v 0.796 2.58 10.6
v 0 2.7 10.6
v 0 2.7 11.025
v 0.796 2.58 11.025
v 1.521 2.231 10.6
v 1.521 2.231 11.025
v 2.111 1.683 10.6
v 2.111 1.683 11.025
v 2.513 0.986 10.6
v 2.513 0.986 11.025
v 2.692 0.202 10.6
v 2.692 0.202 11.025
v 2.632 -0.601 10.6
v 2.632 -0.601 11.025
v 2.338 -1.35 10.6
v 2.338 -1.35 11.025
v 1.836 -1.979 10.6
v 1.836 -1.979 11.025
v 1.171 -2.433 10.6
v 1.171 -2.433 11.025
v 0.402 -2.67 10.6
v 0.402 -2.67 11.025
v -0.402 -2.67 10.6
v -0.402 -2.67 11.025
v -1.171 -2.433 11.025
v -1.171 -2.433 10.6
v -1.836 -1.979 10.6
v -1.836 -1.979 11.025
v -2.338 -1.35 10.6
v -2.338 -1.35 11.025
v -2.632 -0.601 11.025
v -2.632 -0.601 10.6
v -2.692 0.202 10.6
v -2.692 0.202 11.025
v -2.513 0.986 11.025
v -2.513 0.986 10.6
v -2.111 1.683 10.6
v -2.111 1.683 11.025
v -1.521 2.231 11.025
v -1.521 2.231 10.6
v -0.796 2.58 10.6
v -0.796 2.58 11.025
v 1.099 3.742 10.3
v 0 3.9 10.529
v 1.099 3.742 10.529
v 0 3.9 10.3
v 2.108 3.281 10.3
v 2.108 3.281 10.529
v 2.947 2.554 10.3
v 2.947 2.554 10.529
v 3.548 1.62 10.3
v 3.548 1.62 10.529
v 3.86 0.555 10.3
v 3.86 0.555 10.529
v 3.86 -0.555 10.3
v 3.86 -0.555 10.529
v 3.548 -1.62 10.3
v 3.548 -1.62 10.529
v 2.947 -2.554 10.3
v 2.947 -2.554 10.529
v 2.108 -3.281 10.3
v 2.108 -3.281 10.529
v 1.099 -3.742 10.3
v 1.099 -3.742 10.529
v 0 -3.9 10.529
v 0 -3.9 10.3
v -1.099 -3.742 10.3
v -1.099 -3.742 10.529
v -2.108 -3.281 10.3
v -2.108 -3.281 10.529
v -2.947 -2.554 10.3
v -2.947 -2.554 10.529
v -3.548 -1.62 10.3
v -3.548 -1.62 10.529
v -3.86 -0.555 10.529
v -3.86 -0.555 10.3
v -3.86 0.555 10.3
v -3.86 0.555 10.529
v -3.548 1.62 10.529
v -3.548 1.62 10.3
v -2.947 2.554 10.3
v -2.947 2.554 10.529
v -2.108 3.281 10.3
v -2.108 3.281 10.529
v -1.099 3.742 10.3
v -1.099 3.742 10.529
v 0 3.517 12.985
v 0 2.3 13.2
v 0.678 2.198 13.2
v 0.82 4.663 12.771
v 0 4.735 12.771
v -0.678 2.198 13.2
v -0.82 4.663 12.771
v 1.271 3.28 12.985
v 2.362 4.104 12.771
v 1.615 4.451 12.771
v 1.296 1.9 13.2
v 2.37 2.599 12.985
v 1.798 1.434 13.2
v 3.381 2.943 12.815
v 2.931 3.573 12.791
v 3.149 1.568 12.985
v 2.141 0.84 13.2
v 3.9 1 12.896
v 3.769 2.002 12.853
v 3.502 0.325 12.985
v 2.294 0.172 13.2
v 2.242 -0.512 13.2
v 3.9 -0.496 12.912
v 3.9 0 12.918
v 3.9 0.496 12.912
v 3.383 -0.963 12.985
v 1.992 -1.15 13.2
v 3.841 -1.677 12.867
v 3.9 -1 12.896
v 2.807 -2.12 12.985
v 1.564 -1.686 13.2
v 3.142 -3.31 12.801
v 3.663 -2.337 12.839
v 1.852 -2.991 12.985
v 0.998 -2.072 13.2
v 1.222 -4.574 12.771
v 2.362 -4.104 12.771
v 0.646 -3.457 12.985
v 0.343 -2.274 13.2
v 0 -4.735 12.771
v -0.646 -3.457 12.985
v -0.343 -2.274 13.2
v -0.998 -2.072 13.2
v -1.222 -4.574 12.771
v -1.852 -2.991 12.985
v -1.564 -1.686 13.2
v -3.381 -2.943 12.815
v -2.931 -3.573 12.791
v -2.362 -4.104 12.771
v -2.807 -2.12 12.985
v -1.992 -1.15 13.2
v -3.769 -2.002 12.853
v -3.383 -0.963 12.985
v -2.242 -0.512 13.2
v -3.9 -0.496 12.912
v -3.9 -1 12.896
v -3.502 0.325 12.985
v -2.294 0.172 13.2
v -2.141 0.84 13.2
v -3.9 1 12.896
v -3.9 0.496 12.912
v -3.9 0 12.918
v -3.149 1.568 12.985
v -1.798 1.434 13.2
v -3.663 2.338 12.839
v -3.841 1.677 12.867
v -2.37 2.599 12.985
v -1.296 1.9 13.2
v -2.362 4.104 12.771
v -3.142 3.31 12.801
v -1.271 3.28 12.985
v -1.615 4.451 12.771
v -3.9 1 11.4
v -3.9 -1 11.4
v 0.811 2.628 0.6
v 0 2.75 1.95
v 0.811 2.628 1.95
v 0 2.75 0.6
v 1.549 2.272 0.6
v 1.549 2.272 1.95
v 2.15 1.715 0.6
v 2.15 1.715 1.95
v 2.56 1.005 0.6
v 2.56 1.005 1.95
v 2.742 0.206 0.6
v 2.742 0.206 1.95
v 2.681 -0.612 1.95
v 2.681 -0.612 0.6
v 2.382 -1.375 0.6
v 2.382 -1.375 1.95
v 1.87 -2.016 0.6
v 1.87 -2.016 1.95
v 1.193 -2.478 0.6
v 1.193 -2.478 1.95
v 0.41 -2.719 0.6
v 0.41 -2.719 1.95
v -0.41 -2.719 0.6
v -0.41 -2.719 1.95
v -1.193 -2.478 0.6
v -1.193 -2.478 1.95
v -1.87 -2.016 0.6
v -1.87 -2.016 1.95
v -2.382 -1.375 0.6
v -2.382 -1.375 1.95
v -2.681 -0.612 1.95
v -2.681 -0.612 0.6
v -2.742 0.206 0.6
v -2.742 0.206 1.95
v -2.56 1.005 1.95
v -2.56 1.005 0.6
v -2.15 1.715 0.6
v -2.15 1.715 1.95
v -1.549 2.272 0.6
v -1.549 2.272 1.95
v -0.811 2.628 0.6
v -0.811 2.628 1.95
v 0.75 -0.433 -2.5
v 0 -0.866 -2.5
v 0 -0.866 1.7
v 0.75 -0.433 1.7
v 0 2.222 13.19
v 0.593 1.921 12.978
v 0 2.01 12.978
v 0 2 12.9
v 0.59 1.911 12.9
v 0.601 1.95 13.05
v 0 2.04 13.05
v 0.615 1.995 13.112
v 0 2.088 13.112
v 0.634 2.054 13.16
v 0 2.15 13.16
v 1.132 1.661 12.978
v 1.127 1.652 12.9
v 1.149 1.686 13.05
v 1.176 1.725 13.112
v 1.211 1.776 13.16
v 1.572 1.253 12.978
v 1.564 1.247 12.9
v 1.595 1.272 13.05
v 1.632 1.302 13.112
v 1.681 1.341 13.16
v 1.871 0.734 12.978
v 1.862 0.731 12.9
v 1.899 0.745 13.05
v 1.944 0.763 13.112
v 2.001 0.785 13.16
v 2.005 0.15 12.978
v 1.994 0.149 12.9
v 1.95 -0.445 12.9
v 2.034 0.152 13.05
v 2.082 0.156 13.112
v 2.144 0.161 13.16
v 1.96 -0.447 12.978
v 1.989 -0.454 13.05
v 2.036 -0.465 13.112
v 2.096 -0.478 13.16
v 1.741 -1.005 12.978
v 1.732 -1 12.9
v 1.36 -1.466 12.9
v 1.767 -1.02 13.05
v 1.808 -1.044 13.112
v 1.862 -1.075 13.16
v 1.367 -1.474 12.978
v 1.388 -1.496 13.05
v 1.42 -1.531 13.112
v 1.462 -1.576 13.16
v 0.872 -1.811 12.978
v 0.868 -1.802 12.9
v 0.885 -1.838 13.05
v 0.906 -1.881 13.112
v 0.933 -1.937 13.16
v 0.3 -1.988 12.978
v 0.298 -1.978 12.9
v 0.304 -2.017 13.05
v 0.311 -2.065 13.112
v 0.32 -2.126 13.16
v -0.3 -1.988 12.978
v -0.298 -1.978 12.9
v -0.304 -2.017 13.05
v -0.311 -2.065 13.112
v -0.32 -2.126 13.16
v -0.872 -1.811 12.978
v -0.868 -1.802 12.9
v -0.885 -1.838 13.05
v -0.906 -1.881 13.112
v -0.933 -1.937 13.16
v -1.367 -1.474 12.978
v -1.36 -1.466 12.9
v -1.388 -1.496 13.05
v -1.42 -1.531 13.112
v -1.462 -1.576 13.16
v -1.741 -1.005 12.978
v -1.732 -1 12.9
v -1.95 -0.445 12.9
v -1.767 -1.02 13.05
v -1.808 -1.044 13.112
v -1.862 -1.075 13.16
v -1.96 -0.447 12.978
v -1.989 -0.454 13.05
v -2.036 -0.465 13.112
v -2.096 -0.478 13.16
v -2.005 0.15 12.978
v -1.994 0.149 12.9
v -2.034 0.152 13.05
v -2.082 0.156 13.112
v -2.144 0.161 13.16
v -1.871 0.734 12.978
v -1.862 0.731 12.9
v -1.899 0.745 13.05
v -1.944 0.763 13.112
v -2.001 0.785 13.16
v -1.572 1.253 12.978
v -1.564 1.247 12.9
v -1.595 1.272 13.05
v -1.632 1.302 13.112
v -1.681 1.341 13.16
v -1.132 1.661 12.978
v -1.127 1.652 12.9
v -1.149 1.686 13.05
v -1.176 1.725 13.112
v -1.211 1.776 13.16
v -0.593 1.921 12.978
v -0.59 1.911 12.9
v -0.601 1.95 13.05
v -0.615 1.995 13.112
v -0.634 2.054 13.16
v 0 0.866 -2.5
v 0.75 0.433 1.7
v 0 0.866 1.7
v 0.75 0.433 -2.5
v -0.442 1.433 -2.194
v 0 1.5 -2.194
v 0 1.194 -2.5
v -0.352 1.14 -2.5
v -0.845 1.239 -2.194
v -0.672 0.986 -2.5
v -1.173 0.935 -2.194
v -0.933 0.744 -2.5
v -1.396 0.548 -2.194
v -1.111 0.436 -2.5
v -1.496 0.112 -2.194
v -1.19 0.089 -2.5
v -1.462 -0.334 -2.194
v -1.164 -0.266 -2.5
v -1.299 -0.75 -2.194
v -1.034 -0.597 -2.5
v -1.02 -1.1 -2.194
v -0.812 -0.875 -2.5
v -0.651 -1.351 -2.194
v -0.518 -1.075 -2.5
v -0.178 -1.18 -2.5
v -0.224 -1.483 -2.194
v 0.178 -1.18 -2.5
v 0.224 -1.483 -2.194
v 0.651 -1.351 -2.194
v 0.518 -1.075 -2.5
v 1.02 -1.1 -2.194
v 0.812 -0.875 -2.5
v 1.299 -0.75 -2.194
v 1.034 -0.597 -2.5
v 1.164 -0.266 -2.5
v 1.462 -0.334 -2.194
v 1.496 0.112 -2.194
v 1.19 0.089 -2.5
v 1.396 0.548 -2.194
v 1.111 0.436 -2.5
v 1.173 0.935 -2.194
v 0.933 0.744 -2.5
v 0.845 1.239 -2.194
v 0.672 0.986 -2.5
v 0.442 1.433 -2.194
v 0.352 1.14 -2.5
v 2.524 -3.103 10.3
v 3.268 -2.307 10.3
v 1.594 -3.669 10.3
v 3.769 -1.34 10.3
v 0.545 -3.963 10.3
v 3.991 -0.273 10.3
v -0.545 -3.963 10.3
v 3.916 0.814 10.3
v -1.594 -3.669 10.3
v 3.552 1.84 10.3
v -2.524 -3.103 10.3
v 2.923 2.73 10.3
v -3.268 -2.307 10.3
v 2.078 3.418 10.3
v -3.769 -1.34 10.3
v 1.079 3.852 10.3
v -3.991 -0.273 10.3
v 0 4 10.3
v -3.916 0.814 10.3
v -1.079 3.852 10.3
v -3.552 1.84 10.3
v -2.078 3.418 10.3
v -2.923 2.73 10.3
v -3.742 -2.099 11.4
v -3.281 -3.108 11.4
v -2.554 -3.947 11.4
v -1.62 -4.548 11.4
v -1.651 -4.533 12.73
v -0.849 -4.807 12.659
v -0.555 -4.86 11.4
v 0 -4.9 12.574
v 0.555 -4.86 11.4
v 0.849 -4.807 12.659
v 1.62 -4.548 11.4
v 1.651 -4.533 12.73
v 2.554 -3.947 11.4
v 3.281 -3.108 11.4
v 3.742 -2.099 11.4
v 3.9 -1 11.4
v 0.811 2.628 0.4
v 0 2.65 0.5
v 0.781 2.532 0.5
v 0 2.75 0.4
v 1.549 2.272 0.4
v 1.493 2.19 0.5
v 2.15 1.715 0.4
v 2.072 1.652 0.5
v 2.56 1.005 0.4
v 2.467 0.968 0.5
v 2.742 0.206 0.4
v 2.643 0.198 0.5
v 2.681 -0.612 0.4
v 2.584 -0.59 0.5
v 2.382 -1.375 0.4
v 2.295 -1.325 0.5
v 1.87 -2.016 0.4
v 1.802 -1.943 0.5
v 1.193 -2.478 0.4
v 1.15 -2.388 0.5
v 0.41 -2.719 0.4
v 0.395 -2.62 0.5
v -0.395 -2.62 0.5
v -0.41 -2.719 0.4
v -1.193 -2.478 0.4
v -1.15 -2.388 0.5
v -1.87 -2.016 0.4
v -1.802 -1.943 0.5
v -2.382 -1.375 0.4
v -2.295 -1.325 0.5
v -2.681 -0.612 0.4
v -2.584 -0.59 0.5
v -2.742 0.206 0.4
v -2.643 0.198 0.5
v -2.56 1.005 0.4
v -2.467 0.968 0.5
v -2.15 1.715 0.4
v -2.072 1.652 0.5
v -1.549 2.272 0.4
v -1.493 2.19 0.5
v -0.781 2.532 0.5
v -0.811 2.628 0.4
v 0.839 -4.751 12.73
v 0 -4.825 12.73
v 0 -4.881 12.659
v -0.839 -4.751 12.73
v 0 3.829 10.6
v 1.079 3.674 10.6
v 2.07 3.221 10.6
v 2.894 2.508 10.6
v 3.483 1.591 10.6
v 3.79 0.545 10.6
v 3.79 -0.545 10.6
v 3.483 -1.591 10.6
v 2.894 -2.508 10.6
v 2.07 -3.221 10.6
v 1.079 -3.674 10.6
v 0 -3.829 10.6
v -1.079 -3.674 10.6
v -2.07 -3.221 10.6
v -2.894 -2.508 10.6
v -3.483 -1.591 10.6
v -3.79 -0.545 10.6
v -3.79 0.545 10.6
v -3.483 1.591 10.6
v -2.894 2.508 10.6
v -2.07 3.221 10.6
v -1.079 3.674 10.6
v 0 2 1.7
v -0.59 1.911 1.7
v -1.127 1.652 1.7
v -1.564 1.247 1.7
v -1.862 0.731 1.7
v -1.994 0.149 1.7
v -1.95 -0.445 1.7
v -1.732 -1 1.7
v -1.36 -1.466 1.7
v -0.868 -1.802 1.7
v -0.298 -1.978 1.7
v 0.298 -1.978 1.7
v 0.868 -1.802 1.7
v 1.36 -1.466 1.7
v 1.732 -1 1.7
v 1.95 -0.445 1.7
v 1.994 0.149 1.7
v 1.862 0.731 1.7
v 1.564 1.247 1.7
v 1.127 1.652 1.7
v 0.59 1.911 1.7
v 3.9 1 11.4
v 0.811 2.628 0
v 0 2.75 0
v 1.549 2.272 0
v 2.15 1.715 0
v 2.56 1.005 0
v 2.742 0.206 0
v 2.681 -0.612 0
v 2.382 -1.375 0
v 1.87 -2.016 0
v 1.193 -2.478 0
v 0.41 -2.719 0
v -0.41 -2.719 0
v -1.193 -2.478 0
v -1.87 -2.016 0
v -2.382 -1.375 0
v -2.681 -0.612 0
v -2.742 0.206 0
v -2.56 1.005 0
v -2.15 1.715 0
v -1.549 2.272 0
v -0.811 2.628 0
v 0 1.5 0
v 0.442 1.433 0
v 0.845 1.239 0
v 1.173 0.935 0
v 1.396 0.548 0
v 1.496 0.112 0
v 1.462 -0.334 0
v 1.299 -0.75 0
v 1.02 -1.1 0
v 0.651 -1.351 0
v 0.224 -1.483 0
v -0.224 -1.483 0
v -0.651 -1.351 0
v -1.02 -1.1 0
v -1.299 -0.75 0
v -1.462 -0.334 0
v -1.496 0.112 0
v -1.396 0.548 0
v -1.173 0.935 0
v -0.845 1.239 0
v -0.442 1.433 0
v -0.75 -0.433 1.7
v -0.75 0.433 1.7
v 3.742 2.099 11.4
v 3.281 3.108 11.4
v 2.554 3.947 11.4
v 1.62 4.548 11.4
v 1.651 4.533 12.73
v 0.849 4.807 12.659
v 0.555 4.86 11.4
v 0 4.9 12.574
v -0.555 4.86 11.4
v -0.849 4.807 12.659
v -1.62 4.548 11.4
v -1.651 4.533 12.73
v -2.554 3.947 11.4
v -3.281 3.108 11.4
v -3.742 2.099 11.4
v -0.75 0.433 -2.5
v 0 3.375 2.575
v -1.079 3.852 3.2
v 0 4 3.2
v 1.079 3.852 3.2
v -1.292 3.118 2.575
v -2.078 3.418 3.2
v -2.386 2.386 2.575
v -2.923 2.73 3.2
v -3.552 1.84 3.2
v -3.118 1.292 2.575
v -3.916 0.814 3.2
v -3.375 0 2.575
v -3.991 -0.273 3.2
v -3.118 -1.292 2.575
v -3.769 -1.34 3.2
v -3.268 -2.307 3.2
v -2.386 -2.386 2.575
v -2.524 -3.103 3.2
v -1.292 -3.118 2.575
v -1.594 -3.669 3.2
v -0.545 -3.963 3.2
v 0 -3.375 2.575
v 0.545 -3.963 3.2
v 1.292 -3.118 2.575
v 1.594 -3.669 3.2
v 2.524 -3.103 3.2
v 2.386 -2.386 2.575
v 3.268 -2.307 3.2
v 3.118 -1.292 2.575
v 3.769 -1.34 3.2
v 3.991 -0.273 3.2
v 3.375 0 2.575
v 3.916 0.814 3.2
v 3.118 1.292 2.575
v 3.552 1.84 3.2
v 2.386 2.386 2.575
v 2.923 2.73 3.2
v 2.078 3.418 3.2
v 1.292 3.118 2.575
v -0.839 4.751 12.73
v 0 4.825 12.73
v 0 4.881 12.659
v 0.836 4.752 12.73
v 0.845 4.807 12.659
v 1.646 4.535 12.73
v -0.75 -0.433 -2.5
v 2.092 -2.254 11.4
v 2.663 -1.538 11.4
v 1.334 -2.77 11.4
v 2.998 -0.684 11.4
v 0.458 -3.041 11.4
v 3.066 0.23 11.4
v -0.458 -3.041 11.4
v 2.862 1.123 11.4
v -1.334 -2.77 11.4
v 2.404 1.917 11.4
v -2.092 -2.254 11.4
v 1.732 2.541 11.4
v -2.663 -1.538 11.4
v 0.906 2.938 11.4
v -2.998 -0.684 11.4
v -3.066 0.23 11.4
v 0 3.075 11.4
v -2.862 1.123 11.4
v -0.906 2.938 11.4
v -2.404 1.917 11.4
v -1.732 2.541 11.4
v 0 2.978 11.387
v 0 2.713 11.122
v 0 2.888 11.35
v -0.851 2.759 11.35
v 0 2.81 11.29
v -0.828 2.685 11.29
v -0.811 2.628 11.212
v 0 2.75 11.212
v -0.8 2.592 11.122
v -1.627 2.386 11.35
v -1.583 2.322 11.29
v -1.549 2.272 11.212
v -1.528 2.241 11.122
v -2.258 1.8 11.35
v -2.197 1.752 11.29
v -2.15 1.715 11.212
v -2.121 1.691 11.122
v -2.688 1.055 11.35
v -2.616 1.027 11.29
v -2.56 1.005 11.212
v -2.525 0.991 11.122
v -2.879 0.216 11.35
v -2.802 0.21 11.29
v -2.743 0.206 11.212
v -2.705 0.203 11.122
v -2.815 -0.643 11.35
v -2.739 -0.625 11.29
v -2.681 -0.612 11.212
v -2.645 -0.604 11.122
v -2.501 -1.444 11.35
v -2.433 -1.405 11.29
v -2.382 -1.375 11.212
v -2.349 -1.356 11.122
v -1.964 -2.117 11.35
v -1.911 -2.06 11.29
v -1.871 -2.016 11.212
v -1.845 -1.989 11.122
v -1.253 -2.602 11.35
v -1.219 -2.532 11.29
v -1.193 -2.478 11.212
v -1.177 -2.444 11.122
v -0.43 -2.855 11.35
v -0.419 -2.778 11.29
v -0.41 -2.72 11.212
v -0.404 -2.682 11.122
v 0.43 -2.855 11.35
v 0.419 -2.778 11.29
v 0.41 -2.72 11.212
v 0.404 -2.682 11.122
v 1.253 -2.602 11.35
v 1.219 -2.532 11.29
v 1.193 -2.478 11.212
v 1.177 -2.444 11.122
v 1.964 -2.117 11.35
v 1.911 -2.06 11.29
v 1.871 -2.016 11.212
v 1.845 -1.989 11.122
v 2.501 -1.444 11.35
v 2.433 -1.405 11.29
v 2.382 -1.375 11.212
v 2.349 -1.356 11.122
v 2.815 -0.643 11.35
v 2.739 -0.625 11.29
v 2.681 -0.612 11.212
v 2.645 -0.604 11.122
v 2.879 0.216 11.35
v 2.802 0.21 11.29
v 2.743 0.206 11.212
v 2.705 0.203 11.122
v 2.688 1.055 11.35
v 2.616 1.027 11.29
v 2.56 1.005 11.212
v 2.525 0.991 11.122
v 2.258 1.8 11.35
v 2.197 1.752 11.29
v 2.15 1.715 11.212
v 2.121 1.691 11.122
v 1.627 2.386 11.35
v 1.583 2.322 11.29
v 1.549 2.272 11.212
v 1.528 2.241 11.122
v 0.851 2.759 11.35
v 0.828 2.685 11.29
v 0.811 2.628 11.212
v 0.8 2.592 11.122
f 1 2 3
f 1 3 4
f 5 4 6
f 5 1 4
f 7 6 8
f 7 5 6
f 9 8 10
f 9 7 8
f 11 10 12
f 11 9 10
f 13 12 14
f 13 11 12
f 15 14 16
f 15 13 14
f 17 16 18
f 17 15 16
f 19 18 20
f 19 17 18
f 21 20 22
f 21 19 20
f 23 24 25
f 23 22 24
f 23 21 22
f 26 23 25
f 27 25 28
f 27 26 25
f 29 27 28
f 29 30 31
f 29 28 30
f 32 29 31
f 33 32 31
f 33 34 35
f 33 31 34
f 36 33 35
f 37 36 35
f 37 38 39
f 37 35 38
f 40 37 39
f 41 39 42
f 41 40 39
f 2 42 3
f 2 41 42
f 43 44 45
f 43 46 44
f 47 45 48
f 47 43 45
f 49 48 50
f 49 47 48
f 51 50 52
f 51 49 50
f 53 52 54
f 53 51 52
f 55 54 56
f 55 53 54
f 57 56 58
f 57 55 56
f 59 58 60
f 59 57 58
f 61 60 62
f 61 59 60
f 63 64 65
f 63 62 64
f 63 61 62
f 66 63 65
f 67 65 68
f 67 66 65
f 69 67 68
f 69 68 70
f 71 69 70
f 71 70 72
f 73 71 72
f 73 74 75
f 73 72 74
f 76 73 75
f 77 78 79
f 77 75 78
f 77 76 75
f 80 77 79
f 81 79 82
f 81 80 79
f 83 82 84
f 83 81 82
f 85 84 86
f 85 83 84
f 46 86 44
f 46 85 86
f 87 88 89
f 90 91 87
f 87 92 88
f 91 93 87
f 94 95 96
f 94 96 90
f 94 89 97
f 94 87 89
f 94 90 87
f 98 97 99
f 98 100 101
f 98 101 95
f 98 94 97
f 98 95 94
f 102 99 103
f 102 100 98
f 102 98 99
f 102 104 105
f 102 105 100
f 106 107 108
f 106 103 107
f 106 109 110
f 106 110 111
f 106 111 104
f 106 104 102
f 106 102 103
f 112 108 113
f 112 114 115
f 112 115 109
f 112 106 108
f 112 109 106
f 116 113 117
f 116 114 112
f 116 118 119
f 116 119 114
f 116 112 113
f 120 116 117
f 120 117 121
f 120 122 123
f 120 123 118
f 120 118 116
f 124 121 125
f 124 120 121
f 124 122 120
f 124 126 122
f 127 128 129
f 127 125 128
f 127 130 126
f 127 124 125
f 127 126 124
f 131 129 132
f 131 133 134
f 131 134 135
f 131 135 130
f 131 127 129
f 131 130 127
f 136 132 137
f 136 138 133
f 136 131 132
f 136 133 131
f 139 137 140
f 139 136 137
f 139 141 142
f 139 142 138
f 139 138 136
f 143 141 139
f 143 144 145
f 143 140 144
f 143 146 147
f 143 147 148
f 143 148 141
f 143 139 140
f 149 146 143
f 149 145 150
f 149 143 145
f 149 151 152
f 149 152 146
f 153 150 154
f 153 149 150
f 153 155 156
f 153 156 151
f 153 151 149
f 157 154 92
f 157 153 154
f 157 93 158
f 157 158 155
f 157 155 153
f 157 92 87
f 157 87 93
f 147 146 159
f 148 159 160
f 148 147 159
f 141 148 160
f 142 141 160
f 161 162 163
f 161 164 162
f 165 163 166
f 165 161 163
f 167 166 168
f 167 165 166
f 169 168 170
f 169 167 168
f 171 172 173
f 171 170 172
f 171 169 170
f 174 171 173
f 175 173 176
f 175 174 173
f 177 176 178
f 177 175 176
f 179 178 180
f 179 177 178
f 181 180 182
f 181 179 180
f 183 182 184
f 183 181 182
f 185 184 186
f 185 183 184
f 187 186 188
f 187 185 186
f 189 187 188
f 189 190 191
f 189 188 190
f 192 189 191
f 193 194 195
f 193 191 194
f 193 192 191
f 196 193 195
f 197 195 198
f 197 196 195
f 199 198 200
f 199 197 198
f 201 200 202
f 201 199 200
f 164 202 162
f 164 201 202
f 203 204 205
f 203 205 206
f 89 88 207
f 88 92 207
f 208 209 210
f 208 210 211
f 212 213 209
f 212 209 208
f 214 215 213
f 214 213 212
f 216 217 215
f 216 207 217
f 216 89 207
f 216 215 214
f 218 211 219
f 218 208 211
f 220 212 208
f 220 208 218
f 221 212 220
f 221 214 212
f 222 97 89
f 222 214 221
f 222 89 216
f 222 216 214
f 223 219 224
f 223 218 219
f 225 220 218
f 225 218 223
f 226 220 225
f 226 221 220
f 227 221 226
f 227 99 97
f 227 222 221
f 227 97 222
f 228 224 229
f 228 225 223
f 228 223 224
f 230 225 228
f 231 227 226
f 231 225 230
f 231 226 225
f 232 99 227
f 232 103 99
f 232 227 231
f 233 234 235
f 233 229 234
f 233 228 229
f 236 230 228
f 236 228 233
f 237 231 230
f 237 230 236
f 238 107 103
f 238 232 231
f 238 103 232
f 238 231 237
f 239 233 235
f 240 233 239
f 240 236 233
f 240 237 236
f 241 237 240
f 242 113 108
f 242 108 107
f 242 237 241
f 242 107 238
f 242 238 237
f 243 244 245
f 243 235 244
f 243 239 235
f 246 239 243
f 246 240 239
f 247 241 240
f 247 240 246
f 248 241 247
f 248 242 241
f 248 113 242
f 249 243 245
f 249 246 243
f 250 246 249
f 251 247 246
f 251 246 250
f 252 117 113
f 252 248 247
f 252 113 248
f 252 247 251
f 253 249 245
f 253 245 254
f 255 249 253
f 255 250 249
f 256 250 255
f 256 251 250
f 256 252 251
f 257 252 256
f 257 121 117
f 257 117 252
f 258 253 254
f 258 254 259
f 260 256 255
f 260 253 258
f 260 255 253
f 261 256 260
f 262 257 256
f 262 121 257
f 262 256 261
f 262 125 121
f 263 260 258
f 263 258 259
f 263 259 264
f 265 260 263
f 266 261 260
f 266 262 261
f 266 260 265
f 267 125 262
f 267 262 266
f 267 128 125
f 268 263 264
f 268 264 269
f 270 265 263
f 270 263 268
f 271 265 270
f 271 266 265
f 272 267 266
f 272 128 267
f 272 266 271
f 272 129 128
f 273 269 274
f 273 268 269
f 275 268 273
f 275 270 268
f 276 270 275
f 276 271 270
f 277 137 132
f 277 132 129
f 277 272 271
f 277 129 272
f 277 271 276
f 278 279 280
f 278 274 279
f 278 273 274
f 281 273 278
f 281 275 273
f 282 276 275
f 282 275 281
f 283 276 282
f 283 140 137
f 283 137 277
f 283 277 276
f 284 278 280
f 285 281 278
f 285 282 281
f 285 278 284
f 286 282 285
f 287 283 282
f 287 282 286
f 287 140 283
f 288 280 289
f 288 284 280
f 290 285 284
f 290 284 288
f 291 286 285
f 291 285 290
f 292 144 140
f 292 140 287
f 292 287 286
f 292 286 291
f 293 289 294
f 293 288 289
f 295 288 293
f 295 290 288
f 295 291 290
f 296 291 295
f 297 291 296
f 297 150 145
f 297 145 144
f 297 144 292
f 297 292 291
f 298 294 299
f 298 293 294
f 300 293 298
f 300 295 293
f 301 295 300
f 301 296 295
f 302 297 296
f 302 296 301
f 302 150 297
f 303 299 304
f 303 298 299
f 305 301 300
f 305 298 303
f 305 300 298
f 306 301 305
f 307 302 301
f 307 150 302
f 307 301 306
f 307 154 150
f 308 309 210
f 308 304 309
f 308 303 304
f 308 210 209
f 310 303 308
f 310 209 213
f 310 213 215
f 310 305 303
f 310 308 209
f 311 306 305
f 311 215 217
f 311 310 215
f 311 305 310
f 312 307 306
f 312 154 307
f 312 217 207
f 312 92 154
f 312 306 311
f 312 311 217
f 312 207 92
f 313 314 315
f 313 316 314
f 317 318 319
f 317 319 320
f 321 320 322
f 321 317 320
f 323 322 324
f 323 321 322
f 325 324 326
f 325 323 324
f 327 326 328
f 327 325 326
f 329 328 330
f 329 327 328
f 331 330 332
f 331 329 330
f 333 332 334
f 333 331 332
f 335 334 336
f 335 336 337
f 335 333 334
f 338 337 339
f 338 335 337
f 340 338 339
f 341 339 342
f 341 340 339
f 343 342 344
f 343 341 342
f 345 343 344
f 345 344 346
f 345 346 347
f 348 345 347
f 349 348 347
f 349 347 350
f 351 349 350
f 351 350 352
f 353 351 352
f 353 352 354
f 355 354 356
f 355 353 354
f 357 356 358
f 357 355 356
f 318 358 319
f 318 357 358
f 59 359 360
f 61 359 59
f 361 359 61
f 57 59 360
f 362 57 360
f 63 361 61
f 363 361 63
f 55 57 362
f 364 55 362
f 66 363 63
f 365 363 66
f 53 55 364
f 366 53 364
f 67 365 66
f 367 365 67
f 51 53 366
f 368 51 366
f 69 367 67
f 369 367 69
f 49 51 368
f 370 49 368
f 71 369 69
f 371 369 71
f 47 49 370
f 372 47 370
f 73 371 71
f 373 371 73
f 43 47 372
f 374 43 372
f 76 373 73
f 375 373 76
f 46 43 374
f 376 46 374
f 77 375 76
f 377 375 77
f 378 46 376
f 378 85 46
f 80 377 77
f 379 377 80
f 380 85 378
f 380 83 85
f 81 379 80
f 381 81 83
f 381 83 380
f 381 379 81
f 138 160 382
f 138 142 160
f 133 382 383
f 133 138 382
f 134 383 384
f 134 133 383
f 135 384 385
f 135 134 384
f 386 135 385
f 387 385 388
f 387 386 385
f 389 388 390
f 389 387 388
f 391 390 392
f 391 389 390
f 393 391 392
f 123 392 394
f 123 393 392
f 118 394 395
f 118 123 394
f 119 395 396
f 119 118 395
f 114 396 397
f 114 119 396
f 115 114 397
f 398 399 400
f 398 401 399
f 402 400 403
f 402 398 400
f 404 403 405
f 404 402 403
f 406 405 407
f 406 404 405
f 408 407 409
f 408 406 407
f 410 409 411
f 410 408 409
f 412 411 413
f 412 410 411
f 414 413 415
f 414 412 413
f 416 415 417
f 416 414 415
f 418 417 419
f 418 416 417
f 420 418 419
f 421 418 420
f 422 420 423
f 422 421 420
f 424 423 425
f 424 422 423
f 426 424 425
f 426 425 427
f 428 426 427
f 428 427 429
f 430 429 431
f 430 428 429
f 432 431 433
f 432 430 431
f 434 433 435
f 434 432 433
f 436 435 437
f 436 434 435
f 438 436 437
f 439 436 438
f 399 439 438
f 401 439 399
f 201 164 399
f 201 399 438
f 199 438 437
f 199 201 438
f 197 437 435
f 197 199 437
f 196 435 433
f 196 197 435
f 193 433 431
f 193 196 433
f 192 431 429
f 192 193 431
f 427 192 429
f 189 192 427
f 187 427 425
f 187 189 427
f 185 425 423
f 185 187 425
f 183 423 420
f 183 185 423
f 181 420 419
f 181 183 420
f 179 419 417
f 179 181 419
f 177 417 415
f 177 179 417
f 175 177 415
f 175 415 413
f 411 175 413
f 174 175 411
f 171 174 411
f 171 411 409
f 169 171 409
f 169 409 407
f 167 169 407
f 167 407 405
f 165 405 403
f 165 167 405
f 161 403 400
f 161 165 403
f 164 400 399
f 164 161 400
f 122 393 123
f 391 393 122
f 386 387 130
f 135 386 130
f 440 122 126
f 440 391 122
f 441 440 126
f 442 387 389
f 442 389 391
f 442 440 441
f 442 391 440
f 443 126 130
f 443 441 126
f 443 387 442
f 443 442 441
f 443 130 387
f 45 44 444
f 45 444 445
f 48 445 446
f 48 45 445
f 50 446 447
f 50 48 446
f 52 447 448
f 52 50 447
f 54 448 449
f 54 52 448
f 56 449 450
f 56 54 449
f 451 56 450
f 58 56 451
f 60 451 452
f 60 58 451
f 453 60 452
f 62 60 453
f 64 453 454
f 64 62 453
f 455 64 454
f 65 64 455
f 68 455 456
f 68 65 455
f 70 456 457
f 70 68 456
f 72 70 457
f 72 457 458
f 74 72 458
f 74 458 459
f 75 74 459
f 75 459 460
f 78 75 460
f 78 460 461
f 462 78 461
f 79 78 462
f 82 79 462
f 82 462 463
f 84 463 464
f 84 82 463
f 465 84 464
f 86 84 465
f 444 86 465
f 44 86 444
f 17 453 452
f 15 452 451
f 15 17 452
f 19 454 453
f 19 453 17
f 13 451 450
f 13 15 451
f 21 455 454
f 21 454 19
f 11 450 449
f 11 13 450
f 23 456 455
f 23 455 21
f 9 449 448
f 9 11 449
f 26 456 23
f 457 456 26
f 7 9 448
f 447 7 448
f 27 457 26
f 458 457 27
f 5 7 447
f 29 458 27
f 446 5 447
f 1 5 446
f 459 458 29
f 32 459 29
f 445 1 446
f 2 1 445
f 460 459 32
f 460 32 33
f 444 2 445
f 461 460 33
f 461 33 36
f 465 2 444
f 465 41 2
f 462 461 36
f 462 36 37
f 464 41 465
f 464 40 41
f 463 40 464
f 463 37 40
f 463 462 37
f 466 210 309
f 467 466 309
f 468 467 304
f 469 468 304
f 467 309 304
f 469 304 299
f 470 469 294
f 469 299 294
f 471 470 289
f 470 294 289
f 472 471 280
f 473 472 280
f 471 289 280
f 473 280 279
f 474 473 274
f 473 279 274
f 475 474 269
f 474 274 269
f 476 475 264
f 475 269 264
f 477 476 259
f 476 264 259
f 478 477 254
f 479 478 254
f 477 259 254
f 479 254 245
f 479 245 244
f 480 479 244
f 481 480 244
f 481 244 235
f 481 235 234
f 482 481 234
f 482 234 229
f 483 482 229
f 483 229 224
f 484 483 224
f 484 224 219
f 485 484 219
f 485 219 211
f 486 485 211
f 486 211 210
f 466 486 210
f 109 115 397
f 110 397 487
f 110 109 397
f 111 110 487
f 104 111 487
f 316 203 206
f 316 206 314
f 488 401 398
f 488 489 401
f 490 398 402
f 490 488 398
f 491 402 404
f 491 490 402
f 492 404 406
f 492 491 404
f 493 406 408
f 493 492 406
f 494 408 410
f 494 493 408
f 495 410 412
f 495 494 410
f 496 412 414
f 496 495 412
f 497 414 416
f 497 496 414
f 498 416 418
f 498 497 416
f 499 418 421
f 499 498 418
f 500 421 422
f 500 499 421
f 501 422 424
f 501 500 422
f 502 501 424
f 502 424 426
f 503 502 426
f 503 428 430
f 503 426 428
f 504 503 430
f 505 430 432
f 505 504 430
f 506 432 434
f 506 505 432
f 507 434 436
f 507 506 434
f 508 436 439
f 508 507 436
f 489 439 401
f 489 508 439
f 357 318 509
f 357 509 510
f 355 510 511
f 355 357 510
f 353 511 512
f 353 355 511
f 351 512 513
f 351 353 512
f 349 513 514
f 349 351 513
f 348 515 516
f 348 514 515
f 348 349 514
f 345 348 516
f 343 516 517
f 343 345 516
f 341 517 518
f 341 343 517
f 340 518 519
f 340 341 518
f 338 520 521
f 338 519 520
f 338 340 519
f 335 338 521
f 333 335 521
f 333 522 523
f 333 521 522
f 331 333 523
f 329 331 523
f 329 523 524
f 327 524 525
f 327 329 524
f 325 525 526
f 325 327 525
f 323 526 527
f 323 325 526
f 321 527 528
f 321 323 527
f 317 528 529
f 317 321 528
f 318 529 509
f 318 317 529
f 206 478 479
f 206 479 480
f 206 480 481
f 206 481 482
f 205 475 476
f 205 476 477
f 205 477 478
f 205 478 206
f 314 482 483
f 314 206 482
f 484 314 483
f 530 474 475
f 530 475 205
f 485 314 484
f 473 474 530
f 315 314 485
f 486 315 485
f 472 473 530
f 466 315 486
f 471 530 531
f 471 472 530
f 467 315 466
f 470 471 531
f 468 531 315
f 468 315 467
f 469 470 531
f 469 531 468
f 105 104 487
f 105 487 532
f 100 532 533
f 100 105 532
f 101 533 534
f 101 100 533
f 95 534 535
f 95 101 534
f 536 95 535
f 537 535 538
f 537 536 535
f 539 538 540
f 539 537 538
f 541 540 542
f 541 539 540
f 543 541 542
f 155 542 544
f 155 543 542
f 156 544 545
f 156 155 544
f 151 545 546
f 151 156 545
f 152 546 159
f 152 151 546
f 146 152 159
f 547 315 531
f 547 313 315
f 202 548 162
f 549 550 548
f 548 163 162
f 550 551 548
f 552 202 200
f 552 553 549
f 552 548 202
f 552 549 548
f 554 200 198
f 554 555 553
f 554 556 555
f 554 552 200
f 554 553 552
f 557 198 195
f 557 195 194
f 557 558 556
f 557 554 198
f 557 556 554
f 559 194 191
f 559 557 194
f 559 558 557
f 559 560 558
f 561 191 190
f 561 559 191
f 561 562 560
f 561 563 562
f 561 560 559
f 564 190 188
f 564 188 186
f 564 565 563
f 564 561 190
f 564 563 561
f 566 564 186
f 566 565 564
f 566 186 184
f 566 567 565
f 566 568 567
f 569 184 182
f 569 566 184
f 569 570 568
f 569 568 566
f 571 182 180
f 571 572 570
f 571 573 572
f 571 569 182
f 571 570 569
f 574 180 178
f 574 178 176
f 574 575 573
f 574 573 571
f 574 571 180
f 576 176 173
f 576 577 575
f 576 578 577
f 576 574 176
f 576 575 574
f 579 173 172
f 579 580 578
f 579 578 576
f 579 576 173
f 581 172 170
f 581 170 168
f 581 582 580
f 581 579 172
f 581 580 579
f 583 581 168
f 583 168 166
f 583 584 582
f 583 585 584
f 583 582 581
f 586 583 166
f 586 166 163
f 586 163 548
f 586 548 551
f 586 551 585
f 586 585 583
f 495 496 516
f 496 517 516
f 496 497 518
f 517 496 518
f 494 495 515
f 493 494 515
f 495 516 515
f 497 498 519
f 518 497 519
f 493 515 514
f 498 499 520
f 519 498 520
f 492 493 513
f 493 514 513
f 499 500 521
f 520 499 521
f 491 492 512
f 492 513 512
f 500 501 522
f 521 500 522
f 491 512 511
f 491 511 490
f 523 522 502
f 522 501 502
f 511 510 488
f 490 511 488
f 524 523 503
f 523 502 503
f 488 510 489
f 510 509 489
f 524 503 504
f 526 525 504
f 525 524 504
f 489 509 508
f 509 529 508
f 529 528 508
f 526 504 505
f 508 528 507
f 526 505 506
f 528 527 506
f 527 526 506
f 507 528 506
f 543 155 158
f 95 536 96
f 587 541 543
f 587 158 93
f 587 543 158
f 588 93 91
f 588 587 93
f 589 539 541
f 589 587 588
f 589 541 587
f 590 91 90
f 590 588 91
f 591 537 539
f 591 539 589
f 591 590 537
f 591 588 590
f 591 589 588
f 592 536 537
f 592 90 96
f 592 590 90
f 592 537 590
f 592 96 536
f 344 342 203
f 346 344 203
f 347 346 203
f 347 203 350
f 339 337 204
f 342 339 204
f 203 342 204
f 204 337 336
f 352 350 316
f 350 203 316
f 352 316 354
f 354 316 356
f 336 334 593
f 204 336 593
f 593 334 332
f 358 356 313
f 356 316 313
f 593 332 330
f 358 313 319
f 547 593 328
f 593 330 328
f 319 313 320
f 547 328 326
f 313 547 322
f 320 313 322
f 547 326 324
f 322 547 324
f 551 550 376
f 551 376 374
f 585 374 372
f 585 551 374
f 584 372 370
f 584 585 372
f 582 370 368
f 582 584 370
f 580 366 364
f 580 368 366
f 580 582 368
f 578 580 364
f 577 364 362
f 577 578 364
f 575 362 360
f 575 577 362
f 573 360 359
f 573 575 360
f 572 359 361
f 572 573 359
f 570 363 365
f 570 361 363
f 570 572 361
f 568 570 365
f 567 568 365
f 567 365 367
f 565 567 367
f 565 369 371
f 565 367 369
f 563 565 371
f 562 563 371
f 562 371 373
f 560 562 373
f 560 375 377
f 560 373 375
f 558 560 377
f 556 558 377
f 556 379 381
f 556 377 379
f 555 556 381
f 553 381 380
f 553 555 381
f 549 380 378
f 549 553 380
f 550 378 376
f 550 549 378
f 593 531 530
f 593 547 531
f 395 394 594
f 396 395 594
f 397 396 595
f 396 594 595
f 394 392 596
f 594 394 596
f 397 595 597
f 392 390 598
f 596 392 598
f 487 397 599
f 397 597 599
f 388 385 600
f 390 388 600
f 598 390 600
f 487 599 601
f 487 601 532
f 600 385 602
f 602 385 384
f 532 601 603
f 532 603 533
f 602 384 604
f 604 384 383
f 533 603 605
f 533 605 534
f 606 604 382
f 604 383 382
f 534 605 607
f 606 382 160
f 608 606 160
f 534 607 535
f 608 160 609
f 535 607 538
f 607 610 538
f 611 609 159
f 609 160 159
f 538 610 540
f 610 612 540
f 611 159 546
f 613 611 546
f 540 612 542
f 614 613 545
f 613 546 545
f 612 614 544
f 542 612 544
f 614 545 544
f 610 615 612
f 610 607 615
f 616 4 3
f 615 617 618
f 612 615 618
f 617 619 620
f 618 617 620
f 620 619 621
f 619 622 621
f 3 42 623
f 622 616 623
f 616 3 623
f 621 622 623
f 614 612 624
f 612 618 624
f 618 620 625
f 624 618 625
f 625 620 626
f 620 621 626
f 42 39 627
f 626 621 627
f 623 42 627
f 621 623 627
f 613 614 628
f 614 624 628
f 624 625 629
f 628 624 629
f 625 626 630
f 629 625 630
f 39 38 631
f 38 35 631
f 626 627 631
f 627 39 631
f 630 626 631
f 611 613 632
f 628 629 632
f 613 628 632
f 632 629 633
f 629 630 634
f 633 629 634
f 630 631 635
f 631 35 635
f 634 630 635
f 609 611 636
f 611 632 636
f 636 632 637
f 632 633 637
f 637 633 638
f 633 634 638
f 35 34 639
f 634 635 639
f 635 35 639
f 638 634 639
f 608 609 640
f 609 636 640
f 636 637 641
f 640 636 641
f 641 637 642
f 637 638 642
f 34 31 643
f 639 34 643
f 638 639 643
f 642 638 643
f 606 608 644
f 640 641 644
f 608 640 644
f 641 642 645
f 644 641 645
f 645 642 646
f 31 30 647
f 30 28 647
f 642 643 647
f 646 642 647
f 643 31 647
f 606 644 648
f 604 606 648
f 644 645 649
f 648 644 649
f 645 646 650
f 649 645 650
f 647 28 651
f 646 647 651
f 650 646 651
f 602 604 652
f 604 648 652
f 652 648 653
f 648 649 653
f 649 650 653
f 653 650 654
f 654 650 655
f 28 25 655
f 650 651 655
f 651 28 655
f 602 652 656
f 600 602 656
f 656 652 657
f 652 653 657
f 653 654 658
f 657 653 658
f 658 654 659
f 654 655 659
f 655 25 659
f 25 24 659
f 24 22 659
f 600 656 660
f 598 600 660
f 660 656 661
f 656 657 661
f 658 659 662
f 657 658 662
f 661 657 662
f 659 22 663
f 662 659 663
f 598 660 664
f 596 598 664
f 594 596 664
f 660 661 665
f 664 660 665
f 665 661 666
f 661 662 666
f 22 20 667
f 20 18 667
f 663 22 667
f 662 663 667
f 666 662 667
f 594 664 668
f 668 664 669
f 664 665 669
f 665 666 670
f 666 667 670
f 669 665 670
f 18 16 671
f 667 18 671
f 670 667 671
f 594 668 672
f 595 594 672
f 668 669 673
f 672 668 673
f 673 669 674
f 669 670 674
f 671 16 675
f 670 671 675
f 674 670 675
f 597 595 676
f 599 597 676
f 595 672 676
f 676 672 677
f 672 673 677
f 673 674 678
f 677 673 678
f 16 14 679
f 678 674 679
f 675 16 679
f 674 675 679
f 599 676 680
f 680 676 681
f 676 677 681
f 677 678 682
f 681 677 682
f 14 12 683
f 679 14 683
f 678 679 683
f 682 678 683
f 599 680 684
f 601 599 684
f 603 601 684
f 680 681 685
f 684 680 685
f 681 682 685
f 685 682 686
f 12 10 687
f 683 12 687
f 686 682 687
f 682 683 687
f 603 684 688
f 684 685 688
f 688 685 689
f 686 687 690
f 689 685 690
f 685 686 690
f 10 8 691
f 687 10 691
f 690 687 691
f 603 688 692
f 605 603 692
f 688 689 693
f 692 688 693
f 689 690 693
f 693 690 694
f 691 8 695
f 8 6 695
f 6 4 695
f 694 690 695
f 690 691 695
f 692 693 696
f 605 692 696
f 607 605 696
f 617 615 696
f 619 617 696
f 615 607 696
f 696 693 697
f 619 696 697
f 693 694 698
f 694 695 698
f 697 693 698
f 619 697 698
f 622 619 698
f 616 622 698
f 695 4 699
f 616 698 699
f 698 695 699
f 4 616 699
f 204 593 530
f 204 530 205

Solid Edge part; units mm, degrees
sketch "Sketch1" plane through (0, 0, 0) normal (1, 0, 0) x (0, 1, 0)
  line L0 (0, 1.7) -> (2, 1.7)
  line L1 (2, 1.7) -> (2, 12.9)
  arc A0 (2, 12.9) -> (2.3, 13.2) centre (2.3, 12.9) cw
  line L2 (2.3, 13.2) -> (4.7347, 12.7707)
  arc A1 (4.7347, 12.7707) -> (4.9, 12.5737) centre (4.7, 12.5737) cw
  line L3 (4.9, 12.5737) -> (4.9, 11.4)
  line L4 (4.9, 11.4) -> (3.075, 11.4)
  arc A2 (3.075, 11.4) -> (2.7, 11.025) centre (3.075, 11.025) ccw
  line L5 (2.7, 11.025) -> (2.7, 10.6)
  line L6 (2.7, 10.6) -> (3.8293, 10.6)
  line L7 (3.8293, 10.6) -> (3.9, 10.5293)
  line L8 (3.9, 10.5293) -> (3.9, 10.3)
  line L9 (3.9, 10.3) -> (4, 10.3)
  line L10 (4, 10.3) -> (4, 3.2)
  line L11 (4, 3.2) -> (2.75, 1.95)
  line L12 (2.75, 1.95) -> (2.75, 0.6)
  line L13 (2.75, 0.6) -> (2.65, 0.5)
  line L14 (2.65, 0.5) -> (2.75, 0.4)
  line L15 (2.75, 0.4) -> (2.75, 0)
  line L16 (2.75, 0) -> (1.5, 0)
  line L17 (1.5, 0) -> (1.5, -2.1935)
  line L18 (1.5, -2.1935) -> (1.1935, -2.5)
  line L19 (1.1935, -2.5) -> (0, -2.5)
  line L20 (0, -2.5) -> (0, 1.7)
revolve "RevolvedProtrusion1" add sketch "Sketch1" angle 360 about axis through (0, 0, -2.5) along (0, 0, 1)
cosmetic_thread "Thread1" size "M3"
sketch "Sketch2" plane through (0, 0, -2.5) normal (0, 0, 1) x (1, 0, 0)
  line L0 (-0.75, -0.433) -> (0, -0.866)
  line L1 (0, -0.866) -> (0.75, -0.433)
  line L2 (0.75, -0.433) -> (0.75, 0.433)
  line L3 (0.75, 0.433) -> (0, 0.866)
  line L4 (0, 0.866) -> (-0.75, 0.433)
  line L5 (-0.75, 0.433) -> (-0.75, -0.433)
extrude "ExtrudedCutout_1" cut sketch "Sketch2" along normal blind 4.2
sketch "Sketch3" plane through (0, 0, 13.2) normal (0, 0, 1) x (1, 0, 0)
  line L0 (-10, -10) -> (10, -10)
  line L1 (10, -10) -> (10, 10)
  line L2 (10, 10) -> (-10, 10)
  line L3 (-10, 10) -> (-10, -10)
  line L4 (-3.9, 1) -> (-3.9, -1)
  arc A0 (-3.9, -1) -> (3.9, -1) centre (0, -1) ccw
  line L5 (3.9, -1) -> (3.9, 1)
  arc A1 (3.9, 1) -> (-3.9, 1) centre (0, 1) ccw
extrude "ExtrudedCutout_2" cut sketch "Sketch3" against normal blind 2
properties part number "153314 QSM-M3-4-I"
